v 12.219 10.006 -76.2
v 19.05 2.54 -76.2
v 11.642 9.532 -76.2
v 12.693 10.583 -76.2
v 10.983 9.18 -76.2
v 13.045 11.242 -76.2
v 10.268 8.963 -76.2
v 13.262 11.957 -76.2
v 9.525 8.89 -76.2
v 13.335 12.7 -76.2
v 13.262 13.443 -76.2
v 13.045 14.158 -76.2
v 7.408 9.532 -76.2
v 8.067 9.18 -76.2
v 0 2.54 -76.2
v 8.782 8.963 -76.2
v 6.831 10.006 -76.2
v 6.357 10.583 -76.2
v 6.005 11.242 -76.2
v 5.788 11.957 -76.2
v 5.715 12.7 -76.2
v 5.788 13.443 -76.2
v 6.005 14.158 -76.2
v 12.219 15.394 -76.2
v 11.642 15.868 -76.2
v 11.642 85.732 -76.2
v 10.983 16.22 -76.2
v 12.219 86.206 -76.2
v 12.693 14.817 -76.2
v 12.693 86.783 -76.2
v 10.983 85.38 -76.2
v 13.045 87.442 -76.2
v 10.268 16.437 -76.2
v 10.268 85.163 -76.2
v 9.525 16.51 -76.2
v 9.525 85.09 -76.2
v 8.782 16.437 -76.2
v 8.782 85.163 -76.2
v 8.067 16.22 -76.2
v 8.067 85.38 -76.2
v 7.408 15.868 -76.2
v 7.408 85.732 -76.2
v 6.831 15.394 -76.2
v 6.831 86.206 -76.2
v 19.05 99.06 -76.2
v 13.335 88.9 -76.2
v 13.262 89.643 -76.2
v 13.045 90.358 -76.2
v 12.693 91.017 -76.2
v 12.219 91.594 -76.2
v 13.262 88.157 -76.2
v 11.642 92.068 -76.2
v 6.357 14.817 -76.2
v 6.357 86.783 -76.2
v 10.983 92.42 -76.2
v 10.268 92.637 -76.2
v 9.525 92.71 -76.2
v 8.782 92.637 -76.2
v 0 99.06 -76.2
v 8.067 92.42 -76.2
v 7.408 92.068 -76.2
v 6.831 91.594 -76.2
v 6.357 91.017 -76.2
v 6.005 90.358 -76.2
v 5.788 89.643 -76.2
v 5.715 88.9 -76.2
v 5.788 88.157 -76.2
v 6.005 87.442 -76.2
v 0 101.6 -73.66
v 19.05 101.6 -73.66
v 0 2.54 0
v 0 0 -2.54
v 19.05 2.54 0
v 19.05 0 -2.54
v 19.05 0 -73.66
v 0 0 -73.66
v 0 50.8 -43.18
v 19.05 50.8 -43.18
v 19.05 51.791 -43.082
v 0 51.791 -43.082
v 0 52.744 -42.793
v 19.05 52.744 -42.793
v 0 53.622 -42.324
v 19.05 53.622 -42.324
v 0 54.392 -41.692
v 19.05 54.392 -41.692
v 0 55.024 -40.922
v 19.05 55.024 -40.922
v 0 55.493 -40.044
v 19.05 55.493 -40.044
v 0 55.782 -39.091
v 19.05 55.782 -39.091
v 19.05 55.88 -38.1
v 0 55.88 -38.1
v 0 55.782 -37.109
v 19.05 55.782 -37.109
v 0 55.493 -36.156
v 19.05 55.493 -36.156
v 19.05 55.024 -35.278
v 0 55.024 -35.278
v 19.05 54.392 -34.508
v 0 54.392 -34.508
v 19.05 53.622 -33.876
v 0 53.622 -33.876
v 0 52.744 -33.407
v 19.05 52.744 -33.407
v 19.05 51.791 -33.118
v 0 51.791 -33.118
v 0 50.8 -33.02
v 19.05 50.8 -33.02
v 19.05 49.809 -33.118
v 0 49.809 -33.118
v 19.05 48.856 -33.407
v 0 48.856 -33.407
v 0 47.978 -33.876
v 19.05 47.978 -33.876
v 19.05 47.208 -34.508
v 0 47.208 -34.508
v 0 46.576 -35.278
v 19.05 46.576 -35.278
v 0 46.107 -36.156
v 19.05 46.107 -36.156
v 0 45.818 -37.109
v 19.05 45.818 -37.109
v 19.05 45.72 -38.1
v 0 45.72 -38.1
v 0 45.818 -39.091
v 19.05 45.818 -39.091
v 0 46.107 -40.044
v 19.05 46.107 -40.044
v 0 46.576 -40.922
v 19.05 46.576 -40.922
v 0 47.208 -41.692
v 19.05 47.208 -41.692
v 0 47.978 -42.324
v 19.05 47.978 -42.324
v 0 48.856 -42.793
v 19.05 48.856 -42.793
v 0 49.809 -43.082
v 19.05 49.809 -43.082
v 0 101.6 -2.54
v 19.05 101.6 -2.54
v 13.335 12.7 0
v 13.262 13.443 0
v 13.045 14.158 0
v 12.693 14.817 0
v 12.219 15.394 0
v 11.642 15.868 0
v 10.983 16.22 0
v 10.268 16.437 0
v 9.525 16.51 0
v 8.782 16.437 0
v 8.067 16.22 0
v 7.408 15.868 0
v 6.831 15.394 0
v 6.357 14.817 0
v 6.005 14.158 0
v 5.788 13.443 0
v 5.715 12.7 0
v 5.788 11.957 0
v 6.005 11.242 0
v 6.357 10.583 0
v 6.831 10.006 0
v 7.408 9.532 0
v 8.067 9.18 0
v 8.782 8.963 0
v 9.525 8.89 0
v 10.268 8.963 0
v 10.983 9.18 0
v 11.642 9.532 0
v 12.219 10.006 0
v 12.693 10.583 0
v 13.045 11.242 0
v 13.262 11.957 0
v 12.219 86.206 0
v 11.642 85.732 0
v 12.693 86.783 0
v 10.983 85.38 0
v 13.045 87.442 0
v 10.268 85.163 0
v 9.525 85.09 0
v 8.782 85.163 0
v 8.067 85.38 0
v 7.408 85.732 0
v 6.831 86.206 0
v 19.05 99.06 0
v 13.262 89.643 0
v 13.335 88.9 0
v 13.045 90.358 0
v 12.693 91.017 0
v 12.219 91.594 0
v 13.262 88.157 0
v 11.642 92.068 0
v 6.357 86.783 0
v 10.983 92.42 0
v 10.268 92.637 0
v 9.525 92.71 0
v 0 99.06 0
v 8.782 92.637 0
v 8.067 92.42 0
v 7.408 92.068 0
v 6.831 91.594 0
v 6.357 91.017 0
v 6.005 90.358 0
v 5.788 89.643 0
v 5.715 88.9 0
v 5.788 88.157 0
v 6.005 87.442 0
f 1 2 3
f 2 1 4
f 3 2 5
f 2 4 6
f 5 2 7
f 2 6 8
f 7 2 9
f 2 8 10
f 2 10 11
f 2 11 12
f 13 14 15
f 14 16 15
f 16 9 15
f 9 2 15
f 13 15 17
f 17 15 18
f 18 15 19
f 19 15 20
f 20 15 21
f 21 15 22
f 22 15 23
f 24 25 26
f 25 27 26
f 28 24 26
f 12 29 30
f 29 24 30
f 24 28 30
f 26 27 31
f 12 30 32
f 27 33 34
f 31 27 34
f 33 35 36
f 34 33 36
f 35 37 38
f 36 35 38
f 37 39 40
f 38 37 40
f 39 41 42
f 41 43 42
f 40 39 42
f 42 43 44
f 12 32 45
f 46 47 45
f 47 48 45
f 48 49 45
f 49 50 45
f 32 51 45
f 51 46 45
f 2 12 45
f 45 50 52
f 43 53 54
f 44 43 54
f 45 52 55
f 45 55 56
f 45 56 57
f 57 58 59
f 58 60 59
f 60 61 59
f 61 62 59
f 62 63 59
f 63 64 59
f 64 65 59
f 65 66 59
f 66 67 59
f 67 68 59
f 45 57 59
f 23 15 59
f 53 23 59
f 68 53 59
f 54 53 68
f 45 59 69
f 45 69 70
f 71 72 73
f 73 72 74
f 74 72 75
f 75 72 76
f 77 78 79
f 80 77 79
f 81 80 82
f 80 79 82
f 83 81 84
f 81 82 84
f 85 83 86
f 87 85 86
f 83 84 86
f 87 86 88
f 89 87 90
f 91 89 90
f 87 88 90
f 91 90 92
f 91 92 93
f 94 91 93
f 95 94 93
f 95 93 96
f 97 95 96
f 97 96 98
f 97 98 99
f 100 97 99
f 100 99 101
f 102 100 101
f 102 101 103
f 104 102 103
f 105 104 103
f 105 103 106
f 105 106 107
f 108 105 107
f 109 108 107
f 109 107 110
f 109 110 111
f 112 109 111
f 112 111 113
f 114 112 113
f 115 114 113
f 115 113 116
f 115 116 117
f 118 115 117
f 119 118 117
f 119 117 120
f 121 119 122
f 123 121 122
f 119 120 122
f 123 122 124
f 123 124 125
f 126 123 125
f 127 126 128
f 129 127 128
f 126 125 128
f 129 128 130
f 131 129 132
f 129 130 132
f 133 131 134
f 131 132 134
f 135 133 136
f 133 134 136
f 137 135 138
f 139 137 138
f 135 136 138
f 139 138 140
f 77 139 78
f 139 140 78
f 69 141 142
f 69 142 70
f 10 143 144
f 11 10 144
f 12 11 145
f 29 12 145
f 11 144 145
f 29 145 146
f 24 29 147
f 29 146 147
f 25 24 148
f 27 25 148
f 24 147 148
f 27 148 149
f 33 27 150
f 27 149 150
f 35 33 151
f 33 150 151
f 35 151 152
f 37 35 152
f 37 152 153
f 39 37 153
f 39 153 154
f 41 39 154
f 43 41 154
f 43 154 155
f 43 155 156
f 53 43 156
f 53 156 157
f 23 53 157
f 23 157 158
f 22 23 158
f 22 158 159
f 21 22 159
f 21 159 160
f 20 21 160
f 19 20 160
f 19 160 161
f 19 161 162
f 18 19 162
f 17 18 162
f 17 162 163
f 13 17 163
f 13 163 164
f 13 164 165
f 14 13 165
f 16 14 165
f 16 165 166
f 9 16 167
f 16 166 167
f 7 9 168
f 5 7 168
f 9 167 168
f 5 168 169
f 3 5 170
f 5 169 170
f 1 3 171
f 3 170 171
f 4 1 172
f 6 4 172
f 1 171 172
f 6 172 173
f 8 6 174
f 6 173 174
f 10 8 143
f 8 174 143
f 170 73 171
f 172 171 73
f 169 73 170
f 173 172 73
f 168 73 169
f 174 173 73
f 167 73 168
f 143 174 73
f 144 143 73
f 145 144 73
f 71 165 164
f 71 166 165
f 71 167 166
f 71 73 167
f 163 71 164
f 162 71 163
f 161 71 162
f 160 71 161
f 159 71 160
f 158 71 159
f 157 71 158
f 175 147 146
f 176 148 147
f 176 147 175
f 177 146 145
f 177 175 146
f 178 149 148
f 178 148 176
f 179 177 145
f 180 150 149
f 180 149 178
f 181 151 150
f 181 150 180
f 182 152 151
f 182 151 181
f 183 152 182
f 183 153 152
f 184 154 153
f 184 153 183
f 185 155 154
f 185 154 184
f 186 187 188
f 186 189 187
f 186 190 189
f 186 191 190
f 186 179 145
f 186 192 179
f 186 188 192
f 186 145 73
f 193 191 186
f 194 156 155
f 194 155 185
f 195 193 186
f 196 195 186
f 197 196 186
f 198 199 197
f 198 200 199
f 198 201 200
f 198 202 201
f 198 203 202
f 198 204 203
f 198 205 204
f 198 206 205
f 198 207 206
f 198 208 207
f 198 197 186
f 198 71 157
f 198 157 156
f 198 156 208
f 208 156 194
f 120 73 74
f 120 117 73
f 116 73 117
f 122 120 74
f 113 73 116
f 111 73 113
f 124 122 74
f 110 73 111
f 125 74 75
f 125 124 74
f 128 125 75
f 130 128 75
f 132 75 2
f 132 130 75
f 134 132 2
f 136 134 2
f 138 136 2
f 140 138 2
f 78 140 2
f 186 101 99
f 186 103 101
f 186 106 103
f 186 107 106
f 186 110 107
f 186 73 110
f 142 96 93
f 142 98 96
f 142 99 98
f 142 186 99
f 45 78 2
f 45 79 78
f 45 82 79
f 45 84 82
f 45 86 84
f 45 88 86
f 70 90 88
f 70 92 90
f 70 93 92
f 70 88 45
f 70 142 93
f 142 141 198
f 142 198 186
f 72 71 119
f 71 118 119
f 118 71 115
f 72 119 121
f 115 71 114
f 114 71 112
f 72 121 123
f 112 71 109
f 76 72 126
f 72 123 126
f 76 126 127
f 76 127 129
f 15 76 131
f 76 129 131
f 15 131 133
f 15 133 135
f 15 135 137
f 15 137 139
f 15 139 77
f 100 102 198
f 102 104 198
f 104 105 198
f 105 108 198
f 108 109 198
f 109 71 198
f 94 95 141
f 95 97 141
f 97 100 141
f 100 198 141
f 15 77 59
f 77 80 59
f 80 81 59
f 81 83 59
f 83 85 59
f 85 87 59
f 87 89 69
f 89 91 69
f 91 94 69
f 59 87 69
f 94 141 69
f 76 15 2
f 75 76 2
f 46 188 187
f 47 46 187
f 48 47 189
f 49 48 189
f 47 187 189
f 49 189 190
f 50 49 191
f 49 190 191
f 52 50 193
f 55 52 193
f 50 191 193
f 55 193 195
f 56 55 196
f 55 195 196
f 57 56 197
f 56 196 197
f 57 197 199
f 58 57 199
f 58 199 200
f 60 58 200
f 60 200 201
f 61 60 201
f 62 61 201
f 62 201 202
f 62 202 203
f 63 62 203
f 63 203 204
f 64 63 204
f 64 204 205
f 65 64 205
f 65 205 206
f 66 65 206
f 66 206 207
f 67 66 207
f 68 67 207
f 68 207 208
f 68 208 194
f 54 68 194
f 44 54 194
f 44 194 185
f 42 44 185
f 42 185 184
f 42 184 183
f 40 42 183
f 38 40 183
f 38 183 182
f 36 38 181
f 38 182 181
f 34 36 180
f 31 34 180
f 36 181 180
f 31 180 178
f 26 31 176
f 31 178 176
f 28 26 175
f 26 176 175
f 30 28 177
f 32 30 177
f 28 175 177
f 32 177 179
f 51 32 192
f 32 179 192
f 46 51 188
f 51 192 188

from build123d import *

# Parameters (mm, degrees)
SKETCH1_W           = 76.2
SKETCH1_H           = 101.6
BOSS_EXTRUDE1_DEPTH = 19.05
SKETCH3_R           = 3.81
CUT_EXTRUDE2_DEPTH  = 77.2
SKETCH6_R           = 3.81
CUT_EXTRUDE5_DEPTH  = 77.2
SKETCH5_R           = 5.08
CUT_EXTRUDE4_DEPTH  = 20.05
CHAMFER1_SIZE       = 2.54


with BuildPart() as part:
    # Sketch1 → Boss-Extrude1 (new body)
    with BuildSketch(Plane(origin=(0, 0, 0), x_dir=(0, 0, -1), z_dir=(1, 0, 0))):
        with Locations((38.1, 50.8)):
            Rectangle(SKETCH1_W, SKETCH1_H)
    extrude(amount=BOSS_EXTRUDE1_DEPTH)

    # Sketch3 → Cut-Extrude2 (cut, through all)
    with BuildSketch(Plane.XY):
        with Locations((9.525, 12.7)):
            Circle(SKETCH3_R)
    extrude(amount=-CUT_EXTRUDE2_DEPTH, mode=Mode.SUBTRACT)

    # Sketch6 → Cut-Extrude5 (cut, through all)
    with BuildSketch(Plane.XY):
        with Locations((9.525, 88.9)):
            Circle(SKETCH6_R)
    extrude(amount=-CUT_EXTRUDE5_DEPTH, mode=Mode.SUBTRACT)

    # Sketch5 → Cut-Extrude4 (cut, through all)
    with BuildSketch(Plane(origin=(19.05, 0, 0), x_dir=(0, 0, -1), z_dir=(1, 0, 0))):
        with Locations((38.1, 50.8)):
            Circle(SKETCH5_R)
    extrude(amount=-CUT_EXTRUDE4_DEPTH, mode=Mode.SUBTRACT)

    # Chamfer1
    chamfer1_edges = [part.edges().sort_by_distance(p)[0] for p in [
        (9.525, 0, 0),
        (9.525, 101.6, 0),
        (9.525, 101.6, -76.2),
        (9.525, 0, -76.2),
    ]]
    chamfer(chamfer1_edges, length=CHAMFER1_SIZE)


solid = part.part
